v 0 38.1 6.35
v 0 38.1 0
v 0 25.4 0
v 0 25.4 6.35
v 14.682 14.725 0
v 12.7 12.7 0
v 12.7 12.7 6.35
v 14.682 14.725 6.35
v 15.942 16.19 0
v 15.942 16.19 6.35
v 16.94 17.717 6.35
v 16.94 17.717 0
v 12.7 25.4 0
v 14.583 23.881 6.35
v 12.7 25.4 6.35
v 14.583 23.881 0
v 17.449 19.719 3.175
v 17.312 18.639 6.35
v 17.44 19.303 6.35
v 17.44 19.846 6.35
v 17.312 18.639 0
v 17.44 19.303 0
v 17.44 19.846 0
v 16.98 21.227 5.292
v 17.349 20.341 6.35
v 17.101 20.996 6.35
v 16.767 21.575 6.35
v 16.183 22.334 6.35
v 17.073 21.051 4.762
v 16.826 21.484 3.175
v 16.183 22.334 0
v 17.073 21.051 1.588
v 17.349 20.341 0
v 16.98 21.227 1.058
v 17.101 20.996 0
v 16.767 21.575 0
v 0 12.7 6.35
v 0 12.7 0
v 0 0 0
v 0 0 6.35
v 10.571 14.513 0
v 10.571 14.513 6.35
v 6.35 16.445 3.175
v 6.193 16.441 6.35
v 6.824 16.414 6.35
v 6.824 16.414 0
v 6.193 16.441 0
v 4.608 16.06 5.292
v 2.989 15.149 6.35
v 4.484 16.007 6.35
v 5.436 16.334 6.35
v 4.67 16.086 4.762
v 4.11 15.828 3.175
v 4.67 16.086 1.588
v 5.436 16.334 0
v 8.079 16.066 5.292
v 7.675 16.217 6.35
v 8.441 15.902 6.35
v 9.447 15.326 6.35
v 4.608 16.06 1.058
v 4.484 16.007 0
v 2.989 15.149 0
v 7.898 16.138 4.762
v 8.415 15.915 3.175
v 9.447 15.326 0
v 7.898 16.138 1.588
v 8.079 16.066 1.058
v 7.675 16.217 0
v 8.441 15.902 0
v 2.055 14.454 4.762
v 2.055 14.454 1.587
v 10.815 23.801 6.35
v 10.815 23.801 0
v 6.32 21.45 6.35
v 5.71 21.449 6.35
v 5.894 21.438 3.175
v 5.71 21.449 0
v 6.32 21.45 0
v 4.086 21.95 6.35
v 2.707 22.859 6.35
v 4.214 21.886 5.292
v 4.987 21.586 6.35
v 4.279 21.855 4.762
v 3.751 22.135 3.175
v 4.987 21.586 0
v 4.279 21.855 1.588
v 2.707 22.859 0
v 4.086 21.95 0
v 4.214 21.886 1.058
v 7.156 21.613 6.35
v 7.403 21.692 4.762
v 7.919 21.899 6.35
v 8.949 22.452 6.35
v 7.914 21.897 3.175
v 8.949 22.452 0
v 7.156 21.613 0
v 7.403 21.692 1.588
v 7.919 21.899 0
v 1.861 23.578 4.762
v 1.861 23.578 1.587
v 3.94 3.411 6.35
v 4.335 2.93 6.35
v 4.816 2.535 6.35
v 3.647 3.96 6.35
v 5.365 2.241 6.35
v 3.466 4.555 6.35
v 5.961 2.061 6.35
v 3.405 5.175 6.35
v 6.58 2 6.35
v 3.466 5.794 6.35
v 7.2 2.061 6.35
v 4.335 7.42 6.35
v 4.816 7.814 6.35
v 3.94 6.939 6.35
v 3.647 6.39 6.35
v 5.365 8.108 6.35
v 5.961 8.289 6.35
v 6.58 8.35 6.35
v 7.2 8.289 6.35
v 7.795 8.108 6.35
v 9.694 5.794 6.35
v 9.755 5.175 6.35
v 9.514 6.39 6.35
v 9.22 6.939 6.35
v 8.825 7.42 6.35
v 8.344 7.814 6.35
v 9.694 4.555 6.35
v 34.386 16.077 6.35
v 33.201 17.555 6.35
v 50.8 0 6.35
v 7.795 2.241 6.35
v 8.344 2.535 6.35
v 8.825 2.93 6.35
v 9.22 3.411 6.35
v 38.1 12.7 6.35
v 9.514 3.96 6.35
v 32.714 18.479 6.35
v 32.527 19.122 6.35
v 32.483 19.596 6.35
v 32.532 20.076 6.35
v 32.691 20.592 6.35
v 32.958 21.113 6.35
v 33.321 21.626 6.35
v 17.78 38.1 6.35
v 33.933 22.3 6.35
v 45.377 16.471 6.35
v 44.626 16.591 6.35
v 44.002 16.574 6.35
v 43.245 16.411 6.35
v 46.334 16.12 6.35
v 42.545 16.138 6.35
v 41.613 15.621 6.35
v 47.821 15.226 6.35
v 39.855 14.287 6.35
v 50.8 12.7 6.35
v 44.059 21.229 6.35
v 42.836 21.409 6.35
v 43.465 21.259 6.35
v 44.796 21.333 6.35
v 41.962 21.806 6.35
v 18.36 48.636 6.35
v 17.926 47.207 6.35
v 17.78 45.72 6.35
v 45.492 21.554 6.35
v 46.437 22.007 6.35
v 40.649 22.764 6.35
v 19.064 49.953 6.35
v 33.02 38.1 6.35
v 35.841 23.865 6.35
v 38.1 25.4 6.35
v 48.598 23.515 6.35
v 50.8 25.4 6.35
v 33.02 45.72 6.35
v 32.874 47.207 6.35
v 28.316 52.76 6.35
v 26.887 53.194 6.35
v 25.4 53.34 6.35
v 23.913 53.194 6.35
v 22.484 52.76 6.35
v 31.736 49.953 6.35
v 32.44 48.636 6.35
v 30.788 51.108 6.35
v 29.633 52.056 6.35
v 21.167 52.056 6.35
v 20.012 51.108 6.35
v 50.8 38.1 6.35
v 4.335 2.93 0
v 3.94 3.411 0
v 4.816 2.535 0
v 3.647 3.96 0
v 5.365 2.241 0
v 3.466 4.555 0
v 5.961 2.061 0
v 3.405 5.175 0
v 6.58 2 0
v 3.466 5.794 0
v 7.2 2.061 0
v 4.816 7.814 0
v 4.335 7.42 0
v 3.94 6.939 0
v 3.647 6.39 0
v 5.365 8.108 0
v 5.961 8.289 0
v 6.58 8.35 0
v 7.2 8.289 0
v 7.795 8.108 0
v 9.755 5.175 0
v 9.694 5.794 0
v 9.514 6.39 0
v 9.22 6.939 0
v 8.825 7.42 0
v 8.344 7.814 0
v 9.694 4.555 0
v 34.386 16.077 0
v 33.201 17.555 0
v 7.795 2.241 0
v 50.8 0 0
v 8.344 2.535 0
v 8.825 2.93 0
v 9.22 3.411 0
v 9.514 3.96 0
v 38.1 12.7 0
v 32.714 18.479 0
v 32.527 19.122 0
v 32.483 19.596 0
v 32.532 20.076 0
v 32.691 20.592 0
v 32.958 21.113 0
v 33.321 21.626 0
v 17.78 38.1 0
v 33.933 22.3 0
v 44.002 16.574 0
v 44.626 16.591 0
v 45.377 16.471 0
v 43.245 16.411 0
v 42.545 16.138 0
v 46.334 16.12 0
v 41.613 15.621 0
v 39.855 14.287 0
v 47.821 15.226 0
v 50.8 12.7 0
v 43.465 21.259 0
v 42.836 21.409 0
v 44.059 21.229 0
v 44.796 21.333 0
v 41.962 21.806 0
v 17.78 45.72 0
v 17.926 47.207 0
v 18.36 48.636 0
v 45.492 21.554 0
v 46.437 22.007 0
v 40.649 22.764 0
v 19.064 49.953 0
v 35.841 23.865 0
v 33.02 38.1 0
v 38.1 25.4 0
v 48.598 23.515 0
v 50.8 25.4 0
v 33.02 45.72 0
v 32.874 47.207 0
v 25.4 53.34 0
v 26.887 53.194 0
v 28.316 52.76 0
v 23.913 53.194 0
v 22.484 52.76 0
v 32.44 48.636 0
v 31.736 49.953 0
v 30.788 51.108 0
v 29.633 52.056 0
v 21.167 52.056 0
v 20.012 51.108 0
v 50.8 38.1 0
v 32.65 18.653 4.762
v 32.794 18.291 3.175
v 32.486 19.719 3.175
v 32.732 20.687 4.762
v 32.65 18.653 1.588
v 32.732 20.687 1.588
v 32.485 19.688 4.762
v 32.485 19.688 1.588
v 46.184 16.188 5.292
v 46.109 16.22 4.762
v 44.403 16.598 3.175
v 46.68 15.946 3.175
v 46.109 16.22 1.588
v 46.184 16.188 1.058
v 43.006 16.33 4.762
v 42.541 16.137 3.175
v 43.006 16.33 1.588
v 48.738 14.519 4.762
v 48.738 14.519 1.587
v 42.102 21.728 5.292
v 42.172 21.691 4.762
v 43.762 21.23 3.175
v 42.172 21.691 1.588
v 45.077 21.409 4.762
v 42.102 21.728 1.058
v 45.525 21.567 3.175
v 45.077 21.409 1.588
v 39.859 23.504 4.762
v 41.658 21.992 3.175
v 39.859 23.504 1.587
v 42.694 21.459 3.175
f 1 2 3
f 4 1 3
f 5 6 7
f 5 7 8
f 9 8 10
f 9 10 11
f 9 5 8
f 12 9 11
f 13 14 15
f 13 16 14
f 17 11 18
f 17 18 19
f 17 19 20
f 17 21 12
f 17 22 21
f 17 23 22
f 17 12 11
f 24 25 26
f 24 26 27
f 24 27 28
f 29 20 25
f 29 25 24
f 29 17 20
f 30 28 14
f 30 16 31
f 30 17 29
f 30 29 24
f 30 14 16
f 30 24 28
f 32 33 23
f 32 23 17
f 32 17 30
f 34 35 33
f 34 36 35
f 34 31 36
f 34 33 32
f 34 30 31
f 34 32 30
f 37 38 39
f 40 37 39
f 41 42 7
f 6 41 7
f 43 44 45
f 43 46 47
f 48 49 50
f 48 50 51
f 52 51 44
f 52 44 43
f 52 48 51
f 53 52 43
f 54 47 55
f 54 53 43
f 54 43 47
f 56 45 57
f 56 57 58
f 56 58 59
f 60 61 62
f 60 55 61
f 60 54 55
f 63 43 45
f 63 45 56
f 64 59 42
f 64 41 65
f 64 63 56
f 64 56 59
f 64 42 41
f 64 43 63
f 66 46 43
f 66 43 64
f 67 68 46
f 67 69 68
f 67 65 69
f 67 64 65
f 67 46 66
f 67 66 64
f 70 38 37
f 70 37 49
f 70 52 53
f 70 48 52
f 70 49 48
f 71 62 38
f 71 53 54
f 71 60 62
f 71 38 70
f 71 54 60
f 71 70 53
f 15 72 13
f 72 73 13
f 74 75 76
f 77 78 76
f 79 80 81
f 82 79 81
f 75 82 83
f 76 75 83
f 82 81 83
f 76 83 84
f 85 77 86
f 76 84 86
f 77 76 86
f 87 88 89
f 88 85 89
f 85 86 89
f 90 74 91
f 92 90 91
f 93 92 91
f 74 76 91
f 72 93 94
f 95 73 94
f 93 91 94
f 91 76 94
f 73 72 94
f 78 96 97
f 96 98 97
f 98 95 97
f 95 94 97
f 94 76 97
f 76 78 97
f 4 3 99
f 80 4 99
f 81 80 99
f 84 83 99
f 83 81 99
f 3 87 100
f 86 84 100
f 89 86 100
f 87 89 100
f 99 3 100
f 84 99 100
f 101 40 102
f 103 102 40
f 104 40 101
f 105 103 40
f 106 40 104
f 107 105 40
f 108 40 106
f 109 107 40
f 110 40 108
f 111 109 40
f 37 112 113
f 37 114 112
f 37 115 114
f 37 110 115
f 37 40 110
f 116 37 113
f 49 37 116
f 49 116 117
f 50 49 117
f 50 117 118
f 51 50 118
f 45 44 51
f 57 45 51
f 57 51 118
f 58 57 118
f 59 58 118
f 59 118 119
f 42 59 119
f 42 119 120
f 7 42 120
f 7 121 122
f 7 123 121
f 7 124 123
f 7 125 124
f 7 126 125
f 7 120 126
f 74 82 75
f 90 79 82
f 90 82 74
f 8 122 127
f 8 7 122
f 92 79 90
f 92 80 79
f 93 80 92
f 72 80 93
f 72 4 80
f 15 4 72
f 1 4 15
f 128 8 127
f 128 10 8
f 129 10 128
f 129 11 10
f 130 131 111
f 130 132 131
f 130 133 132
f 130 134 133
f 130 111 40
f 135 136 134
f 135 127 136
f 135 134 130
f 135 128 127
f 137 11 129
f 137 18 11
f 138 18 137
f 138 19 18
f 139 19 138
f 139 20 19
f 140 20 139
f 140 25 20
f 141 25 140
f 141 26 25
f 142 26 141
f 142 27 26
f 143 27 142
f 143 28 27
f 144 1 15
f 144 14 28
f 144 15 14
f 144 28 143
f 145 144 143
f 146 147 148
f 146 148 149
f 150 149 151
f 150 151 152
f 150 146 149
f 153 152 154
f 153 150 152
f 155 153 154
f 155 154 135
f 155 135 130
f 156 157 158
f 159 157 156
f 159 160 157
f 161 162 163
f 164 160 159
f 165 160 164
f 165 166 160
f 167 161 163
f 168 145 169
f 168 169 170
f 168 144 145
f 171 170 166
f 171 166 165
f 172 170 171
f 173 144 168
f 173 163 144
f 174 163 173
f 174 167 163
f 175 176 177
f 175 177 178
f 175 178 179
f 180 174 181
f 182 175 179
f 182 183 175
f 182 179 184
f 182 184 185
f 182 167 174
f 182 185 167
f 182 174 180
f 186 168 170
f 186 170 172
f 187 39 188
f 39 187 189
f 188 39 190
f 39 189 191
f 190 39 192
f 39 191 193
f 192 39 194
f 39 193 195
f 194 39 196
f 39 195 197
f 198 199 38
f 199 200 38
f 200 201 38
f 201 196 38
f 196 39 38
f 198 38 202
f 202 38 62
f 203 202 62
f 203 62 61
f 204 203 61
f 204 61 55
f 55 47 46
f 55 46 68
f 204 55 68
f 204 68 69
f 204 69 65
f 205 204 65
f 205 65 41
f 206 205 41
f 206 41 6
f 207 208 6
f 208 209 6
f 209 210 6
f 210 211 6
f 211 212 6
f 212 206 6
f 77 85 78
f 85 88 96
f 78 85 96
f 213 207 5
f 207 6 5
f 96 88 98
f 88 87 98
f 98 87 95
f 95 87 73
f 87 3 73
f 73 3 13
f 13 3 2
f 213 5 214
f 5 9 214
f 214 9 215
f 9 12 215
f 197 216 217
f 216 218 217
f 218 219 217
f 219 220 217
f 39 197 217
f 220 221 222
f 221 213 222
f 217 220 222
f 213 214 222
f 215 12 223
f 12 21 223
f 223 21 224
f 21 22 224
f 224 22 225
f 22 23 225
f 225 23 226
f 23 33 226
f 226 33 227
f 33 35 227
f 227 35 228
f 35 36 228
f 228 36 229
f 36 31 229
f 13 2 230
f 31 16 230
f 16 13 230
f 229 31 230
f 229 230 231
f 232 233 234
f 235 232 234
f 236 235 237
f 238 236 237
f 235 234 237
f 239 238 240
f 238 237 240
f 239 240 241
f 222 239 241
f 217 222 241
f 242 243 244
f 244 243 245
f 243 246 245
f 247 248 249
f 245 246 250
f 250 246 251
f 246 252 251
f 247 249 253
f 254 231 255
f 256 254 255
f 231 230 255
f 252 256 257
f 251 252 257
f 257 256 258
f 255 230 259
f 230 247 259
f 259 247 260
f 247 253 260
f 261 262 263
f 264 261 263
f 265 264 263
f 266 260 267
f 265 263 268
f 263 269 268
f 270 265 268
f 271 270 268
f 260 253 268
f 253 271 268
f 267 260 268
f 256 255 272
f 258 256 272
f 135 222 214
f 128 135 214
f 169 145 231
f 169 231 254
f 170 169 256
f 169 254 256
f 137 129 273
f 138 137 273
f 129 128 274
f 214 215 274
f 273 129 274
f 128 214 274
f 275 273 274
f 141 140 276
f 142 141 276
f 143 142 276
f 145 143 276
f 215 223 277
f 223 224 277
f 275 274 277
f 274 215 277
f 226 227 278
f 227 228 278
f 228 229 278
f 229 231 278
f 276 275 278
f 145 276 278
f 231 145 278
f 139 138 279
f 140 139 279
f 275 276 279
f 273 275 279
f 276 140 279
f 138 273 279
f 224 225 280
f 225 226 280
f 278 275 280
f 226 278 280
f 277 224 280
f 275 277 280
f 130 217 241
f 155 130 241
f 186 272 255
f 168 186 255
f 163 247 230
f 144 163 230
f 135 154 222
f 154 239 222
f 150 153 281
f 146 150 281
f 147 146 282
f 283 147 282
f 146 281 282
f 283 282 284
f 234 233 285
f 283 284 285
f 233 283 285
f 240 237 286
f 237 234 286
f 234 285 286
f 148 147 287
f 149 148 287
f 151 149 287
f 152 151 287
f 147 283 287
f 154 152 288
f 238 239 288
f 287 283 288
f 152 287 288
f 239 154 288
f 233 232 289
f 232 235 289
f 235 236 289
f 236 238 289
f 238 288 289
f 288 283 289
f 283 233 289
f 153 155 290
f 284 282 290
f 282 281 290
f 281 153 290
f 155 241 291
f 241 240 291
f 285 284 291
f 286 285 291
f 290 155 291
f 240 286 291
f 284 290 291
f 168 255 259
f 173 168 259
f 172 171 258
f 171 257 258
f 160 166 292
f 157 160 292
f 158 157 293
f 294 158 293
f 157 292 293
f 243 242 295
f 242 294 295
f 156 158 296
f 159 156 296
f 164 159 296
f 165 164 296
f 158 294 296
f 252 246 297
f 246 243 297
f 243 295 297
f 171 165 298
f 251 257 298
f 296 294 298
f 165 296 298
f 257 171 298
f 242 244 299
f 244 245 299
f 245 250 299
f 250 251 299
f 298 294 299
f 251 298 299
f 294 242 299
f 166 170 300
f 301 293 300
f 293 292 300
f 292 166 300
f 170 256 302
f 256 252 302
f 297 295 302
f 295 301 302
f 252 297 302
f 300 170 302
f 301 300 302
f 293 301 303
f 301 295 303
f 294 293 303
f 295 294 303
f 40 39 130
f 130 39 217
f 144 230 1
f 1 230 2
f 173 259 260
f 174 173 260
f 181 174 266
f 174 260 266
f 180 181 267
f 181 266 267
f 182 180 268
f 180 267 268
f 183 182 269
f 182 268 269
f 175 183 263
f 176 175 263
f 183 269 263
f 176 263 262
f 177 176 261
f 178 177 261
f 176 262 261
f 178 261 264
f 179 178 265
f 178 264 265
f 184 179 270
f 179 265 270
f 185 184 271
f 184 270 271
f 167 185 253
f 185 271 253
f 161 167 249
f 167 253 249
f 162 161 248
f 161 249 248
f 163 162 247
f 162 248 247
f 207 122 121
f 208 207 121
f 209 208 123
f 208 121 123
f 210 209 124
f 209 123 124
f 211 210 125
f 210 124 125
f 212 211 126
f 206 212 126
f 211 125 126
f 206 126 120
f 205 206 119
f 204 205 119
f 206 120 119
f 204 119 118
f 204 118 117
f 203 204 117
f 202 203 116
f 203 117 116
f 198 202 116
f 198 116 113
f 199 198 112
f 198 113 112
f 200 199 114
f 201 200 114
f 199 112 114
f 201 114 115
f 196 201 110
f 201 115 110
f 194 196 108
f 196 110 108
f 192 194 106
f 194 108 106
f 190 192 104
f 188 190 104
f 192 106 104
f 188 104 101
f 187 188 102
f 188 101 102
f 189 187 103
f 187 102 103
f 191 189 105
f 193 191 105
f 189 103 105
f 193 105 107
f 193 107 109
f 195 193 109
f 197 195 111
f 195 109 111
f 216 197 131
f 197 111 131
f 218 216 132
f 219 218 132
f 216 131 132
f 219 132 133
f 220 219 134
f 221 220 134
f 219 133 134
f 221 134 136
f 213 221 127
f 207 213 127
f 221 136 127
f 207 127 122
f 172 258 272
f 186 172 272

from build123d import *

# Parameters (mm, degrees)
F1_DEPTH = 6.35
F2_R     = 3.175
F3_DEPTH = 6.35


with BuildPart() as f1:
    # F0 (on Top) → F1 (new body)
    with BuildSketch(Plane.XY):
        with BuildLine():
            Line((0, 12.7), (0, 0))
            Line((0, 0), (50.8, 0))
            Line((50.8, 0), (50.8, 12.7))
            add(Edge.make_bspline(
                [(50.8, 12.7), (48.6625255622, 14.6524333598), (44.3991061989, 18.5467686764), (40.1959131853, 14.6454060899), (38.1, 12.7)],
                knots=[0, 0, 0, 0, 0.5013521438, 1, 1, 1, 1], degree=3))
            add(Edge.make_bspline(
                [(38.1, 12.7), (35.2362812476, 15.1247093608), (29.6729807092, 19.8351533876), (35.3467927178, 23.5818985232), (38.1, 25.4)],
                knots=[0, 0, 0, 0, 0.5147517616, 1, 1, 1, 1], degree=3))
            add(Edge.make_bspline(
                [(38.1, 25.4), (39.9179639958, 23.3656390647), (43.6968492215, 19.1369433918), (48.37331205, 23.2603179807), (50.8, 25.4)],
                knots=[0, 0, 0, 0, 0.4810847346, 1, 1, 1, 1], degree=3))
            Line((50.8, 25.4), (50.8, 38.1))
            Line((50.8, 38.1), (33.02, 38.1))
            Line((33.02, 38.1), (33.02, 45.72))
            ThreePointArc((33.02, 45.72), (25.4, 53.34), (17.78, 45.72))
            Line((17.78, 45.72), (17.78, 38.1))
            Line((17.78, 38.1), (0, 38.1))
            Line((0, 38.1), (0, 25.4))
            add(Edge.make_bspline(
                [(0, 25.4), (1.9184660831, 23.4522608086), (5.857149342, 19.4534787537), (10.3801014579, 23.3839796805), (12.7, 25.4)],
                knots=[0, 0, 0, 0, 0.487083108, 1, 1, 1, 1], degree=3))
            add(Edge.make_bspline(
                [(12.7, 12.7), (15.1297413304, 15.1206540979), (19.8306937088, 19.8040249145), (15.0228529426, 23.577087991), (12.7, 25.4)],
                knots=[0, 0, 0, 0, 0.5168615069, 1, 1, 1, 1], degree=3))
            add(Edge.make_bspline(
                [(0, 12.7), (2.1166666667, 14.5722865894), (6.35, 18.3168597683), (10.5833333333, 14.5722865894), (12.7, 12.7)],
                knots=[0, 0, 0, 0, 0.5, 1, 1, 1, 1], degree=3))
        make_face()
    extrude(amount=F1_DEPTH)

    # F2 (on face) → F3 (cut, through all)
    with BuildSketch(Plane.XY.offset(6.35)):
        with Locations((6.5801870078, 5.1745763049)):
            Circle(F2_R)
    extrude(amount=-F3_DEPTH, mode=Mode.SUBTRACT)


solid = f1.part
